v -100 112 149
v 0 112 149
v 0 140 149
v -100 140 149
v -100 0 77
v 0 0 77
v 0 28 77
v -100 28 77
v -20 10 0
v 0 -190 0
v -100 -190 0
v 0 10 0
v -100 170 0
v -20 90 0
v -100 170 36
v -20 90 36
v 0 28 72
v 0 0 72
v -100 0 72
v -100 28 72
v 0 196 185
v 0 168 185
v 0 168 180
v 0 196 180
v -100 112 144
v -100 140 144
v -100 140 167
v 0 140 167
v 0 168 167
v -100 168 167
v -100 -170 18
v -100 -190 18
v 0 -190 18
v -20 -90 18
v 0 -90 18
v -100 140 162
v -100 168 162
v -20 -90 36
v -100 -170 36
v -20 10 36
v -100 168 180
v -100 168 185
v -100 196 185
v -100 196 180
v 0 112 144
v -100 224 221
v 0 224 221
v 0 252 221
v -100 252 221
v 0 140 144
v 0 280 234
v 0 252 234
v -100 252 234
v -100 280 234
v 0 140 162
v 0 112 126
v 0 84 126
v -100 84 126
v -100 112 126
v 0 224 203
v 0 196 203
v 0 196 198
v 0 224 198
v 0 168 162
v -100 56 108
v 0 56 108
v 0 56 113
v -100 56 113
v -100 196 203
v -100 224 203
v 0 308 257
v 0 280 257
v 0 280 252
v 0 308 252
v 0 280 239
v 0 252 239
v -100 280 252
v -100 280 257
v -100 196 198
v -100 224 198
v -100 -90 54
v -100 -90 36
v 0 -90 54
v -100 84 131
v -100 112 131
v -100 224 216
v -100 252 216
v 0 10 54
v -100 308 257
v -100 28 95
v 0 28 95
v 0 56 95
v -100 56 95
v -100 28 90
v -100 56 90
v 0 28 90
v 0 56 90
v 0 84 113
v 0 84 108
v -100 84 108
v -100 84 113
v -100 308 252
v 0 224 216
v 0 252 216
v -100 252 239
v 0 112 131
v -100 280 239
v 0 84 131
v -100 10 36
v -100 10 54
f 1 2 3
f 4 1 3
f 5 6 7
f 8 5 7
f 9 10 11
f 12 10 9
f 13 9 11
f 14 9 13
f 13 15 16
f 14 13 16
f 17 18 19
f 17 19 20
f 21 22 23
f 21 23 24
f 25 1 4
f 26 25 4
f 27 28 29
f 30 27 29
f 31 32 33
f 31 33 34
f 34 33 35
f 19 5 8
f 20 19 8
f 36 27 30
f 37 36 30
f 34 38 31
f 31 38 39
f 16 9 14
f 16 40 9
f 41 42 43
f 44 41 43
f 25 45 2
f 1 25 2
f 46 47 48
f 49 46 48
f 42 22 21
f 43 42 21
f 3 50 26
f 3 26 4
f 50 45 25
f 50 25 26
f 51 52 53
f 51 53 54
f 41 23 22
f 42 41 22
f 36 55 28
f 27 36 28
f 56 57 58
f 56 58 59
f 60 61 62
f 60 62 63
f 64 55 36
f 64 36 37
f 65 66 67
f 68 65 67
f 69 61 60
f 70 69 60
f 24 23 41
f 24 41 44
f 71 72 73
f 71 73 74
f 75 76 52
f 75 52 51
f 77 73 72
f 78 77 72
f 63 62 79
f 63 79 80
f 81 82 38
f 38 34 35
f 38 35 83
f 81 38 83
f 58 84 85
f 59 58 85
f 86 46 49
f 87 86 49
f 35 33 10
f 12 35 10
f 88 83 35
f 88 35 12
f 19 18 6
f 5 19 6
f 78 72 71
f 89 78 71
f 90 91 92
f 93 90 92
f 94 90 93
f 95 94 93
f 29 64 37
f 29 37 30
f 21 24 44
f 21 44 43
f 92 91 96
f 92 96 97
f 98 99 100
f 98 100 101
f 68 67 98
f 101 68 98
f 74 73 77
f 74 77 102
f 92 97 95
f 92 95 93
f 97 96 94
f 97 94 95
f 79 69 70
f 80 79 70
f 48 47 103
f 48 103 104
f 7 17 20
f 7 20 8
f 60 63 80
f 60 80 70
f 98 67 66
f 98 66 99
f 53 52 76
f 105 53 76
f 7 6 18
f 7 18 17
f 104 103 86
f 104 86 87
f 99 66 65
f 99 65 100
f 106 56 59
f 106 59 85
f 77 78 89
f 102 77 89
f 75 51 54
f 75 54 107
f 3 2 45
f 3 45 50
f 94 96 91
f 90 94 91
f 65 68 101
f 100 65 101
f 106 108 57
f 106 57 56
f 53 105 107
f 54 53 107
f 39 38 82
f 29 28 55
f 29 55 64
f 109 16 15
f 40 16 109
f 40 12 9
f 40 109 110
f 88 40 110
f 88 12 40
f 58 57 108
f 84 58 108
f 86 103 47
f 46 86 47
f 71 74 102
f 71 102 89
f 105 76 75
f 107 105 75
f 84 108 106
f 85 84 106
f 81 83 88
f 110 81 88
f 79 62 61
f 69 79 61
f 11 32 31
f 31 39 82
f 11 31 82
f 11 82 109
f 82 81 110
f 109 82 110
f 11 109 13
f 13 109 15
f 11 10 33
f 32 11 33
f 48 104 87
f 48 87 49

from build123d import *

# Parameters (mm, degrees)
F1_START  = -20
F1_DEPTH  = 80
F2_W      = 28
F2_H      = 5
F3_DEPTH  = 100
F4_W      = 120
F4_H      = 18
F5_DEPTH  = 100
F6_W      = 100
F6_H      = 54
F7_DEPTH  = 100
F9_DEPTH  = 18
F11_DEPTH = 86


with BuildPart() as f1:
    # F0 (on Right) → F1 (new body)
    with BuildSketch(Plane.YZ.offset(F1_START)):
        Polygon((-170, 36), (-170, 0), (0, 0), (170, 0), (170, 36), (0, 36), align=None)
    extrude(amount=-F1_DEPTH)

    # F4 (on Right) → F5 (join)
    with BuildSketch(Plane.YZ):
        with Locations((-130, 9)):
            Rectangle(F4_W, F4_H)
    extrude(amount=-F5_DEPTH)

    # F6 (on Right) → F7 (join)
    with BuildSketch(Plane.YZ):
        with Locations((-40, 27)):
            Rectangle(F6_W, F6_H)
    extrude(amount=-F7_DEPTH)

    # F8 (on face) → F9 (cut)
    with BuildSketch(Plane.XY.offset(36)):
        Polygon((-20, -90), (-100, -170), (-20, -170), align=None)
    extrude(amount=-F9_DEPTH, mode=Mode.SUBTRACT)

    # F10 (on face) → F11 (cut)
    with BuildSketch(Plane.XY.offset(36)):
        Polygon((-20, 170), (-100, 170), (-20, 90), align=None)
    extrude(amount=-F11_DEPTH, mode=Mode.SUBTRACT)


with BuildPart() as f3:
    # F2 (on Right) → F3 (new body)
    with BuildSketch(Plane.YZ):
        with Locations((14, 74.5)):
            Rectangle(F2_W, F2_H)
    extrude(amount=-F3_DEPTH)


with BuildPart() as f3b:
    # F2 (on Right) → F3, piece 2 (new body)
    with BuildSketch(Plane.YZ):
        with Locations((42, 92.5)):
            Rectangle(F2_W, F2_H)
    extrude(amount=-F3_DEPTH)


with BuildPart() as f3c:
    # F2 (on Right) → F3, piece 3 (new body)
    with BuildSketch(Plane.YZ):
        with Locations((70, 110.5)):
            Rectangle(F2_W, F2_H)
    extrude(amount=-F3_DEPTH)


with BuildPart() as f3d:
    # F2 (on Right) → F3, piece 4 (new body)
    with BuildSketch(Plane.YZ):
        with Locations((98, 128.5)):
            Rectangle(F2_W, F2_H)
    extrude(amount=-F3_DEPTH)


with BuildPart() as f3e:
    # F2 (on Right) → F3, piece 5 (new body)
    with BuildSketch(Plane.YZ):
        with Locations((126, 146.5)):
            Rectangle(F2_W, F2_H)
    extrude(amount=-F3_DEPTH)


with BuildPart() as f3f:
    # F2 (on Right) → F3, piece 6 (new body)
    with BuildSketch(Plane.YZ):
        with Locations((154, 164.5)):
            Rectangle(F2_W, F2_H)
    extrude(amount=-F3_DEPTH)


with BuildPart() as f3g:
    # F2 (on Right) → F3, piece 7 (new body)
    with BuildSketch(Plane.YZ):
        with Locations((182, 182.5)):
            Rectangle(F2_W, F2_H)
    extrude(amount=-F3_DEPTH)


with BuildPart() as f3h:
    # F2 (on Right) → F3, piece 8 (new body)
    with BuildSketch(Plane.YZ):
        with Locations((210, 200.5)):
            Rectangle(F2_W, F2_H)
    extrude(amount=-F3_DEPTH)


with BuildPart() as f3i:
    # F2 (on Right) → F3, piece 9 (new body)
    with BuildSketch(Plane.YZ):
        with Locations((238, 218.5)):
            Rectangle(F2_W, F2_H)
    extrude(amount=-F3_DEPTH)


with BuildPart() as f3j:
    # F2 (on Right) → F3, piece 10 (new body)
    with BuildSketch(Plane.YZ):
        with Locations((266, 236.5)):
            Rectangle(F2_W, F2_H)
    extrude(amount=-F3_DEPTH)


with BuildPart() as f3k:
    # F2 (on Right) → F3, piece 11 (new body)
    with BuildSketch(Plane.YZ):
        with Locations((294, 254.5)):
            Rectangle(F2_W, F2_H)
    extrude(amount=-F3_DEPTH)


solid = Compound([f1.part, f3.part, f3b.part, f3c.part, f3d.part, f3e.part, f3f.part, f3g.part, f3h.part, f3i.part, f3j.part, f3k.part])
